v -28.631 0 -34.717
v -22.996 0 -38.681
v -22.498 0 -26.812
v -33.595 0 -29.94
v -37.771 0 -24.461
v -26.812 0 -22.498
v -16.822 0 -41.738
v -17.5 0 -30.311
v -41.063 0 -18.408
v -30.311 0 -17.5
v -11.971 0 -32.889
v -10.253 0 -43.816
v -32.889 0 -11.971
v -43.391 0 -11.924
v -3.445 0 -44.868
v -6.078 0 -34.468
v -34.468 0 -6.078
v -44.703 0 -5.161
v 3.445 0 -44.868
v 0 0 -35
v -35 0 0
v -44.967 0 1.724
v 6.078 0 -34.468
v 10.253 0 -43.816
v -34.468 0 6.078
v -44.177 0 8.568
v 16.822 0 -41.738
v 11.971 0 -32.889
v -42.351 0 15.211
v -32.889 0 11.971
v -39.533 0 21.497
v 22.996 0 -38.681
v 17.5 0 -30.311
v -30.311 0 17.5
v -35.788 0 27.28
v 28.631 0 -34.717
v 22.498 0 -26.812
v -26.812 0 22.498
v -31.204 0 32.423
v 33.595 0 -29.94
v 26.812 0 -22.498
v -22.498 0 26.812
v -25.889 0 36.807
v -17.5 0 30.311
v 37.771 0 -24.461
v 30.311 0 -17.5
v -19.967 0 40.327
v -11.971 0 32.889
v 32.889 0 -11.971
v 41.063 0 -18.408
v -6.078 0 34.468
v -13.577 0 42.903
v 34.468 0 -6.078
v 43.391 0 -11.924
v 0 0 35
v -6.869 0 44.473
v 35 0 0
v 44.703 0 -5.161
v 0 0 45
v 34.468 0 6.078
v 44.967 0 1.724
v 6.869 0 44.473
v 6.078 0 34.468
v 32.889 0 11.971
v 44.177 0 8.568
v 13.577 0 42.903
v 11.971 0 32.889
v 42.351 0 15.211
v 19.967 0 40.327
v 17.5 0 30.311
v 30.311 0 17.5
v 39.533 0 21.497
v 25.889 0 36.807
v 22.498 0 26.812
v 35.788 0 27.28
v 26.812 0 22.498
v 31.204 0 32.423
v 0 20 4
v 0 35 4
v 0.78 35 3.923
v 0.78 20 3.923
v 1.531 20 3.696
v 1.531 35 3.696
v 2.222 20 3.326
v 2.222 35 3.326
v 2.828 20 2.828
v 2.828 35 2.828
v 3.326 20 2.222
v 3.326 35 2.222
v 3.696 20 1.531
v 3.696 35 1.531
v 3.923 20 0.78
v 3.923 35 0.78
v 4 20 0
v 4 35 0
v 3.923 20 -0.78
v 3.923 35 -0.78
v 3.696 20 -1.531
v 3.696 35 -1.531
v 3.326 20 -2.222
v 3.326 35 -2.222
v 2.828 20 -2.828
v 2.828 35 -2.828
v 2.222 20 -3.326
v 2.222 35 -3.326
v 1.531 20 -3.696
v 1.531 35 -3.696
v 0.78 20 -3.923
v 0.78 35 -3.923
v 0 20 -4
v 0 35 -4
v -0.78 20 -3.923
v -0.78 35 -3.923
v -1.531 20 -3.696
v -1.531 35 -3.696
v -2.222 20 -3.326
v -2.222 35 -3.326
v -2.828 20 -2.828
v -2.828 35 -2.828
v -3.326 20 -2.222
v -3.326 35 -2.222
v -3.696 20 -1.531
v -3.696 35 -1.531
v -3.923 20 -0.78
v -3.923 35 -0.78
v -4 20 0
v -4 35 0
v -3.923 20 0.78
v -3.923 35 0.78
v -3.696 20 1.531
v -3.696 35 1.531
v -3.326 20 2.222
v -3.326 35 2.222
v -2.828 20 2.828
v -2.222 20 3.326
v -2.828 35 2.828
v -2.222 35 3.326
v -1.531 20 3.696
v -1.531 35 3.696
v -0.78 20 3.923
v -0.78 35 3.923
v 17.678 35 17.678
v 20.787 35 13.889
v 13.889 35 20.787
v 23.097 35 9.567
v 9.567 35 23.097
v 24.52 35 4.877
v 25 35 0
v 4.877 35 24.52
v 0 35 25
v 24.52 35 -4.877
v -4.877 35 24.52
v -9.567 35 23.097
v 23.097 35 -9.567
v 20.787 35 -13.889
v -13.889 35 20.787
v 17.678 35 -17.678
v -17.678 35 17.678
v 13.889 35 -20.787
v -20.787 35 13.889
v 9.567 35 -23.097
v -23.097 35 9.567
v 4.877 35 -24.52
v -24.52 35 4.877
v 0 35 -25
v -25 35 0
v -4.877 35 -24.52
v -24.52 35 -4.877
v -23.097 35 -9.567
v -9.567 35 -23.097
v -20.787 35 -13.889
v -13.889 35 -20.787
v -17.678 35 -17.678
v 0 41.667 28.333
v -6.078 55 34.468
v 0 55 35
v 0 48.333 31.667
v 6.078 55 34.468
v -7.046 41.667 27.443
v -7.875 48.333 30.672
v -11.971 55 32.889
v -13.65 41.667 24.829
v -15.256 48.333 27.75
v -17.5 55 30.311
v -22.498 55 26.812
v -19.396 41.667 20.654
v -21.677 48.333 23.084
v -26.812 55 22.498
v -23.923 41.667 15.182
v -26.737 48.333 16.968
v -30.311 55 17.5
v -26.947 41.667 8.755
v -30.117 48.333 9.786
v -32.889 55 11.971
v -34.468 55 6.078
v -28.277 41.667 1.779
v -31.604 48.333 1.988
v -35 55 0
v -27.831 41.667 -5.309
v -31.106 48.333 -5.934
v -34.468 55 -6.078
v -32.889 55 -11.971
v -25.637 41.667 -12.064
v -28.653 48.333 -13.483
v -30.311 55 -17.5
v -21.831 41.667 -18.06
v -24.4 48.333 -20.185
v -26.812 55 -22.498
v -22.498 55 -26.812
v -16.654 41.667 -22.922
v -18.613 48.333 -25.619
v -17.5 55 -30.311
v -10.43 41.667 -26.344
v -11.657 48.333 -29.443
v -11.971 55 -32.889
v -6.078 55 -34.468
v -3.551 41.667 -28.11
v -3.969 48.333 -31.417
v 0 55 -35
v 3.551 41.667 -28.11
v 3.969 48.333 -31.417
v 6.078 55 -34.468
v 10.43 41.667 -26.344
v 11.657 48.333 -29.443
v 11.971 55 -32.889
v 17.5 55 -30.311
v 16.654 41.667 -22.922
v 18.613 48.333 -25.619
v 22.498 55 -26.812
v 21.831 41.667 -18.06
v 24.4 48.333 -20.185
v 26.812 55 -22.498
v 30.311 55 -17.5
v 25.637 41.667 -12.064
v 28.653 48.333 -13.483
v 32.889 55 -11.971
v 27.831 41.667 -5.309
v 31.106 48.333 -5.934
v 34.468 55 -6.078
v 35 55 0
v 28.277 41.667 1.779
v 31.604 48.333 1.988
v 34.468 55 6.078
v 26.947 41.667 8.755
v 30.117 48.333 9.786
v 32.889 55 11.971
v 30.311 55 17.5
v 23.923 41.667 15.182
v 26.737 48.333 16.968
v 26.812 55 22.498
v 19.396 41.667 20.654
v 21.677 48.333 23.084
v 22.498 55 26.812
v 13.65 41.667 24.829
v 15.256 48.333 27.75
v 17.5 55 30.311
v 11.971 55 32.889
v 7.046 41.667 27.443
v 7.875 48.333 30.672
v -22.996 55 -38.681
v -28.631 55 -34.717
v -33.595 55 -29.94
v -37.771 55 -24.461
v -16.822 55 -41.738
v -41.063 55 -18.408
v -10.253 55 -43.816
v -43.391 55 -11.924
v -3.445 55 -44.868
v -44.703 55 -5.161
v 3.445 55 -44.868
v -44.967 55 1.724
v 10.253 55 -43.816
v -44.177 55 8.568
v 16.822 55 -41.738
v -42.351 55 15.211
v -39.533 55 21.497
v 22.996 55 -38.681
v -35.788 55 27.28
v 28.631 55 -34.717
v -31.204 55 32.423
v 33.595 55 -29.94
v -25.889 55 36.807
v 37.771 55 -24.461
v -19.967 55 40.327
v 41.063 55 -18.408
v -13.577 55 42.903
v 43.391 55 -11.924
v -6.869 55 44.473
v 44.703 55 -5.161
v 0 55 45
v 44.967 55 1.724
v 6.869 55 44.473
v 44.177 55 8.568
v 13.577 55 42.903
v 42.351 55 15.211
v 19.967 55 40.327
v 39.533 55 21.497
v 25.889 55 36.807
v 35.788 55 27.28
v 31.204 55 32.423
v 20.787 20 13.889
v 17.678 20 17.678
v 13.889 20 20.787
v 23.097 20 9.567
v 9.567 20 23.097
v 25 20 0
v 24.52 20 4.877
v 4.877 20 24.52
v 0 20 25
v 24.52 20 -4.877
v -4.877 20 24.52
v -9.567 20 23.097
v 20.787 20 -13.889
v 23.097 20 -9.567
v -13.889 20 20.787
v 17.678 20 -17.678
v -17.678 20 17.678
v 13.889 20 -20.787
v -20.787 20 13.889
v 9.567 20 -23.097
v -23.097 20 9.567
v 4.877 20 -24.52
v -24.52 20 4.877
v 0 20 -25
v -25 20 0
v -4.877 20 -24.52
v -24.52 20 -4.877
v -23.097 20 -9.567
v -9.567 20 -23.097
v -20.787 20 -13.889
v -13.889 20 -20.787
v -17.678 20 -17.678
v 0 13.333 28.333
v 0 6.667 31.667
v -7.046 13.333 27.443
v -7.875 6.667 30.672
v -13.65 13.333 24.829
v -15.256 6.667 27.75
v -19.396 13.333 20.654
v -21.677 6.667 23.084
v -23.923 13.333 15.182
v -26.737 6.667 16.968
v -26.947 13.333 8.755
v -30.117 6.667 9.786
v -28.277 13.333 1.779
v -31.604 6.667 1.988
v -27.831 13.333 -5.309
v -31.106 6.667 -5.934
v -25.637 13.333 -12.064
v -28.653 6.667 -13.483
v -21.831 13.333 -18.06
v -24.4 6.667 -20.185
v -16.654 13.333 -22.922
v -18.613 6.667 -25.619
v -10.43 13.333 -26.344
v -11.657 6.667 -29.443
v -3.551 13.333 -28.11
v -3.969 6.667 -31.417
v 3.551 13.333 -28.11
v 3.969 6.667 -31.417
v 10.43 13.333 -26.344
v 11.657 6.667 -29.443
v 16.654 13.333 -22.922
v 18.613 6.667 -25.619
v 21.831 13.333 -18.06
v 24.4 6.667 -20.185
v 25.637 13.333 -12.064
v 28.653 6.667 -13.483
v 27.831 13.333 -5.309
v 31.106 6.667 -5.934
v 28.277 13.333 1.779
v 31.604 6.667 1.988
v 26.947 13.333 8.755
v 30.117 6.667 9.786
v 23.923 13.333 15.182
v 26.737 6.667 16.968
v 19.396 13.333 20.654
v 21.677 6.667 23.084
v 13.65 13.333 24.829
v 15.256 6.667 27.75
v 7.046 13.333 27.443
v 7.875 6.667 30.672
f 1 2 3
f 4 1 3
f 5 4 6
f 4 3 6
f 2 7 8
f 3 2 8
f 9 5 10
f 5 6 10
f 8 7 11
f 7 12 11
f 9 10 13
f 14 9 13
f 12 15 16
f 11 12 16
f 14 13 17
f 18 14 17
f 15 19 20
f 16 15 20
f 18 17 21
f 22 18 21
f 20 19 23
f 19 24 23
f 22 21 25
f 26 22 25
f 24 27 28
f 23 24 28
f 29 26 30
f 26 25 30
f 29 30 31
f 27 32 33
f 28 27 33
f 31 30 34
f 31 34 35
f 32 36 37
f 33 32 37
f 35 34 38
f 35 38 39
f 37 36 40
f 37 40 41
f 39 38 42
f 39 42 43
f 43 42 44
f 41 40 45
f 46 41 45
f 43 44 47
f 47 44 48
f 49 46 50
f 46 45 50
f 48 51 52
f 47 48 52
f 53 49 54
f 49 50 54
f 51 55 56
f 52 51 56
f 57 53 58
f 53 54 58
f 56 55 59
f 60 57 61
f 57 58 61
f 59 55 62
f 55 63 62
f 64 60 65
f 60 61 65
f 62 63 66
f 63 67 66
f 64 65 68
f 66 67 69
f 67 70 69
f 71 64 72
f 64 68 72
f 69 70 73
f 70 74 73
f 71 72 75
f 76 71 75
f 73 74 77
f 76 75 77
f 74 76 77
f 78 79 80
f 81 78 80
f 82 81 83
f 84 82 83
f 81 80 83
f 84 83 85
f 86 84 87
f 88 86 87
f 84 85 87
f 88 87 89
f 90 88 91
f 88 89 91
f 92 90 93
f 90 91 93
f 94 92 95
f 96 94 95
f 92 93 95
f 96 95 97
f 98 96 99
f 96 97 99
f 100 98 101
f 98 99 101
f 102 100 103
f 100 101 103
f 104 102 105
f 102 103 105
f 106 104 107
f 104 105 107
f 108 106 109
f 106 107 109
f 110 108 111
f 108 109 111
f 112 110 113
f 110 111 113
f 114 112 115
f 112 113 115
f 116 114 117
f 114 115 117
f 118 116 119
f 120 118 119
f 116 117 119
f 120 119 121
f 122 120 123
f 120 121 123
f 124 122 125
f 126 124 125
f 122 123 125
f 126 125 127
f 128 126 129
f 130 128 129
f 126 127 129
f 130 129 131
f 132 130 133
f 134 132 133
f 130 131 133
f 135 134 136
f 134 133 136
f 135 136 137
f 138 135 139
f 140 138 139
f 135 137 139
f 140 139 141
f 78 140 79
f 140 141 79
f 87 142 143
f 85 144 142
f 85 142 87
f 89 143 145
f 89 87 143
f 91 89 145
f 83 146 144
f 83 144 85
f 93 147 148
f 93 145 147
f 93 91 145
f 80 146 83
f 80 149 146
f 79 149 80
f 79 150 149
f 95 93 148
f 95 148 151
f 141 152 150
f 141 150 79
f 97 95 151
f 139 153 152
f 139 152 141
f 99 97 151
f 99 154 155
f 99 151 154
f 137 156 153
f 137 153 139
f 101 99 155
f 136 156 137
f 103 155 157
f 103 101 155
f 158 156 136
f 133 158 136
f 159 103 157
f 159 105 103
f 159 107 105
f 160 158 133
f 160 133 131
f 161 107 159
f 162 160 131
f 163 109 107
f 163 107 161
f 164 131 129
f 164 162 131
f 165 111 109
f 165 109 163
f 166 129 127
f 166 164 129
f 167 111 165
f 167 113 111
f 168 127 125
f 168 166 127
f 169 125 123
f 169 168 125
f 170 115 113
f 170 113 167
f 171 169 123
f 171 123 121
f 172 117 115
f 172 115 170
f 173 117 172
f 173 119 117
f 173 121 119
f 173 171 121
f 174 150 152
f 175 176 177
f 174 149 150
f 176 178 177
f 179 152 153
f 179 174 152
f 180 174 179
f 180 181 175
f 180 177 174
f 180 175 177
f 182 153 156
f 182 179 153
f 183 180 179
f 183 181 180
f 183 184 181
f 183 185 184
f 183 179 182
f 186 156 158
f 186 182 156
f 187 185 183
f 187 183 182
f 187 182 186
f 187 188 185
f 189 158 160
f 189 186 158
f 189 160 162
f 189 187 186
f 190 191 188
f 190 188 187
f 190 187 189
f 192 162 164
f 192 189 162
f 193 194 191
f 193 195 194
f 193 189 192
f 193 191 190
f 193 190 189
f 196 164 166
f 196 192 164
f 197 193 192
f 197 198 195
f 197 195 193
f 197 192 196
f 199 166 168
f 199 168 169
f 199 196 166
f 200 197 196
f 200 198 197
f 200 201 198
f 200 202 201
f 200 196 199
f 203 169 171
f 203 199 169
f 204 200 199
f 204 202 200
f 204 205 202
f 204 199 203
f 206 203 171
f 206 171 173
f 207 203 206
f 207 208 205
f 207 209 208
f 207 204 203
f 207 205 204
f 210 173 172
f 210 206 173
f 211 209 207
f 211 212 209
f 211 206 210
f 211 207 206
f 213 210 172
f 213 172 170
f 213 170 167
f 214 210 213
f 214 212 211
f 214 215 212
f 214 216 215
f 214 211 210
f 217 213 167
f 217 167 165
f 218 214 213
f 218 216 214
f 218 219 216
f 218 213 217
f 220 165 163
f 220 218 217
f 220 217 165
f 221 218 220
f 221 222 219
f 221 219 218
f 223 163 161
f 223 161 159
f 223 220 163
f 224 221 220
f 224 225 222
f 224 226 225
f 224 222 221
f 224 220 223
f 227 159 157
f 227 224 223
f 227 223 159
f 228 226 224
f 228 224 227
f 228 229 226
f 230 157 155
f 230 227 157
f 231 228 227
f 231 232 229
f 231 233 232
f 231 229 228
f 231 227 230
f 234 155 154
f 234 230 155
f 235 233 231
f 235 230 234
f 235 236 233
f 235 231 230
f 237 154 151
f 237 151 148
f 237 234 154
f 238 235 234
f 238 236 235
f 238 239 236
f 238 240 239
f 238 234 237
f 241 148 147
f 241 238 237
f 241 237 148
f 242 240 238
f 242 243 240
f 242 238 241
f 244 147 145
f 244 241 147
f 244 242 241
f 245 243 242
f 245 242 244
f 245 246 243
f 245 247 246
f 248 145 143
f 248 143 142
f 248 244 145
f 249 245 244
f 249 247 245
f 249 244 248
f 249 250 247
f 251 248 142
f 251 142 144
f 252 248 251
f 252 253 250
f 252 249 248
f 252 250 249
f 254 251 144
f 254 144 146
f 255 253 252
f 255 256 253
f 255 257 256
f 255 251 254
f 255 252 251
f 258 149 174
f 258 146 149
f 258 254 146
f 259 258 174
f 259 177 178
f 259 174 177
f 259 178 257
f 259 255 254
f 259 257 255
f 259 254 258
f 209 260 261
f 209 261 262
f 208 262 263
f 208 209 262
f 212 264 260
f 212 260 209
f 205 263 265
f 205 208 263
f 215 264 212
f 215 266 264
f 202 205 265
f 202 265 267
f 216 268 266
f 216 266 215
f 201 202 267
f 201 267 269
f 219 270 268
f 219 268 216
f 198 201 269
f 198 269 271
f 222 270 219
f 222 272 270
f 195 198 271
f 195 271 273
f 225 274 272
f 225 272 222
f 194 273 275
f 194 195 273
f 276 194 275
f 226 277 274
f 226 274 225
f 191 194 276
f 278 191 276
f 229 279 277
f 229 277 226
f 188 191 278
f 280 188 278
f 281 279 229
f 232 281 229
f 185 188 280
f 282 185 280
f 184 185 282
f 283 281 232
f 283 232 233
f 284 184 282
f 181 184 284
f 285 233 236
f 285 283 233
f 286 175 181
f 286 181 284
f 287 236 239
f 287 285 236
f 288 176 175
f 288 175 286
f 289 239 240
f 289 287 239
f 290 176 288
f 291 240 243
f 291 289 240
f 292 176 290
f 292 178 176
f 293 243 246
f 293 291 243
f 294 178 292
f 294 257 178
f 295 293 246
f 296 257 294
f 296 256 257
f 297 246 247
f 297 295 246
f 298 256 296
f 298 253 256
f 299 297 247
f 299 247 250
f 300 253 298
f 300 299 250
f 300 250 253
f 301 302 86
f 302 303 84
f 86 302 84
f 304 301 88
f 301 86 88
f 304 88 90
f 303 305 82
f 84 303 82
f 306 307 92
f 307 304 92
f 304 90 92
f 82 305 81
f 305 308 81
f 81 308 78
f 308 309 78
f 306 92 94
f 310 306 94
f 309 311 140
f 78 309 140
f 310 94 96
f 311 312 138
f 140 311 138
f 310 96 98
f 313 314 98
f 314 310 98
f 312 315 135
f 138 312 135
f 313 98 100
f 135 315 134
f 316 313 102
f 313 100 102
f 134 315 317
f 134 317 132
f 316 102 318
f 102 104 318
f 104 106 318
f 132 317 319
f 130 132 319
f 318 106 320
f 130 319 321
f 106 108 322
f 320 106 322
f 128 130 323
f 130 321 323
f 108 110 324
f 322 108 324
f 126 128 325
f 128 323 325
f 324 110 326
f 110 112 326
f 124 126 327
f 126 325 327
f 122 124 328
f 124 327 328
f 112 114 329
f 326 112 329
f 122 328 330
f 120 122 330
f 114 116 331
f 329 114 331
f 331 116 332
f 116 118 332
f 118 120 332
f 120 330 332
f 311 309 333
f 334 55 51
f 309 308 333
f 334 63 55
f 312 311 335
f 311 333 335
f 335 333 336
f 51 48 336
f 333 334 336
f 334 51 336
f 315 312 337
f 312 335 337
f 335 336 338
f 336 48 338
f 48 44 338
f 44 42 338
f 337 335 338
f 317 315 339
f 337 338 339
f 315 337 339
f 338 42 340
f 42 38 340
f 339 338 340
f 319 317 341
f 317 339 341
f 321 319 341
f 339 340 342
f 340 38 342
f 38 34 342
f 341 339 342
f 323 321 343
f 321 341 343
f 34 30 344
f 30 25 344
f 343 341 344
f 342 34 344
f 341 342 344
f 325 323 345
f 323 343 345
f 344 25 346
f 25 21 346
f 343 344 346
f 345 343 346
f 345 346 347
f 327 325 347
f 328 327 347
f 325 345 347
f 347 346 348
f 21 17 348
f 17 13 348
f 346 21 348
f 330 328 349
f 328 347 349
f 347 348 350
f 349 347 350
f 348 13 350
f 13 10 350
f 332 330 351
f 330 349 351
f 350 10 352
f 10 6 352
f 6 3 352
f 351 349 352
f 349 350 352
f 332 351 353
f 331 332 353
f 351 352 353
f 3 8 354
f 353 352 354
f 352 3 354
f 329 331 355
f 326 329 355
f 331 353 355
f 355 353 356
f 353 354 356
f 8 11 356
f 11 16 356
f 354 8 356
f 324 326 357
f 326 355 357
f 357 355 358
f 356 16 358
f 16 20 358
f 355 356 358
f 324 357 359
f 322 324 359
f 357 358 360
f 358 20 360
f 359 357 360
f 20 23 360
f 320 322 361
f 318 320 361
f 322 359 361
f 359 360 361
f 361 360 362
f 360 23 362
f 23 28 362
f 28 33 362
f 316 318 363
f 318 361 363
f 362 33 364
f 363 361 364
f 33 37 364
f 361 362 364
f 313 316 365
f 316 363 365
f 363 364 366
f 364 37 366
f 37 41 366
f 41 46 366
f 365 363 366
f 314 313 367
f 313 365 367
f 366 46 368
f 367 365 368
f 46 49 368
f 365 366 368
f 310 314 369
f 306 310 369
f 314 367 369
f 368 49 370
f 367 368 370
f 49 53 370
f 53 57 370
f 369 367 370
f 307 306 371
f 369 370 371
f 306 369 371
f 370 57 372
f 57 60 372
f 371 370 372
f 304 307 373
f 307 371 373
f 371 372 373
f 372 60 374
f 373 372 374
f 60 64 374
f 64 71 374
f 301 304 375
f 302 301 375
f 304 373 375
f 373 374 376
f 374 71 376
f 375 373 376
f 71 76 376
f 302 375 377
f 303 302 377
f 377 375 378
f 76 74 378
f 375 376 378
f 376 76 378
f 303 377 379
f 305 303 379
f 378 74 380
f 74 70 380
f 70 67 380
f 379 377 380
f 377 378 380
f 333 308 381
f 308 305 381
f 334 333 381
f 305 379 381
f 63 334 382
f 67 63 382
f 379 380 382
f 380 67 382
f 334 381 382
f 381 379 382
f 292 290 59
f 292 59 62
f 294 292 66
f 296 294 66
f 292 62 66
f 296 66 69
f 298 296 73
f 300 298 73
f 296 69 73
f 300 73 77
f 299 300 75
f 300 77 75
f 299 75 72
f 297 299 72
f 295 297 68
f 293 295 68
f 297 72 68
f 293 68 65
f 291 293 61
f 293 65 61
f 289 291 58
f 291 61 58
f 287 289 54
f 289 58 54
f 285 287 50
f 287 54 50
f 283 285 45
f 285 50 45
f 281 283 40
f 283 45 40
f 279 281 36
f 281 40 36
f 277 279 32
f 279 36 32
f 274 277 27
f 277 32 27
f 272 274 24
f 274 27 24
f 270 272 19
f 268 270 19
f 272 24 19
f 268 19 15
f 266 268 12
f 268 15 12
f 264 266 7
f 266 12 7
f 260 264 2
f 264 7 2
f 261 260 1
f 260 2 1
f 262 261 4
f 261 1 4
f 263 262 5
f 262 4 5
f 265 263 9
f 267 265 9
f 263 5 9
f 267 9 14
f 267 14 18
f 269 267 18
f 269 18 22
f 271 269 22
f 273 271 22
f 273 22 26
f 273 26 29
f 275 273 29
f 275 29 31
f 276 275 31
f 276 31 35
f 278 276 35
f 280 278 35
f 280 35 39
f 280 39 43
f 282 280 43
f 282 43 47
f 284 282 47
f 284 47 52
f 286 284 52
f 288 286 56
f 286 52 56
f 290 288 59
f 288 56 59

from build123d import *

# Parameters (mm, degrees)
SKETCH1_R           = 45
BOSS_EXTRUDE1_DEPTH = 55
SKETCH7_R           = 4
CUT_EXTRUDE1_DEPTH  = 15


with BuildPart() as part:
    # Sketch1 → Boss-Extrude1 (new body)
    with BuildSketch(Plane(origin=(0, 0, 0), x_dir=(1, 0, 0), z_dir=(0, 1, 0))):
        with Locations(Location((0, 0, 0), (0, 0, 270))):
            Circle(SKETCH1_R)
    extrude(amount=BOSS_EXTRUDE1_DEPTH)

    # Sketch6 → Cut-Revolve2 (revolve, cut)
    with BuildSketch(Plane(origin=(0, 0, 0), x_dir=(0, 0, -1), z_dir=(1, 0, 0))):
        Polygon((0, 55), (0, 35), (-25, 35), (-35, 55), align=None)
        Polygon((0, 0), (0, 20), (-25, 20), (-35, 0), align=None)
    revolve(axis=Axis((0, 57.084701854, 0), (0, -1, 0)), mode=Mode.SUBTRACT)

    # Sketch7 → Cut-Extrude1 (cut)
    with BuildSketch(Plane(origin=(0, 35, 0), x_dir=(1, 0, 0), z_dir=(0, 1, 0))):
        with Locations(Location((0, 0, 0), (0, 0, 270))):
            Circle(SKETCH7_R)
    extrude(amount=-CUT_EXTRUDE1_DEPTH, mode=Mode.SUBTRACT)


solid = part.part
